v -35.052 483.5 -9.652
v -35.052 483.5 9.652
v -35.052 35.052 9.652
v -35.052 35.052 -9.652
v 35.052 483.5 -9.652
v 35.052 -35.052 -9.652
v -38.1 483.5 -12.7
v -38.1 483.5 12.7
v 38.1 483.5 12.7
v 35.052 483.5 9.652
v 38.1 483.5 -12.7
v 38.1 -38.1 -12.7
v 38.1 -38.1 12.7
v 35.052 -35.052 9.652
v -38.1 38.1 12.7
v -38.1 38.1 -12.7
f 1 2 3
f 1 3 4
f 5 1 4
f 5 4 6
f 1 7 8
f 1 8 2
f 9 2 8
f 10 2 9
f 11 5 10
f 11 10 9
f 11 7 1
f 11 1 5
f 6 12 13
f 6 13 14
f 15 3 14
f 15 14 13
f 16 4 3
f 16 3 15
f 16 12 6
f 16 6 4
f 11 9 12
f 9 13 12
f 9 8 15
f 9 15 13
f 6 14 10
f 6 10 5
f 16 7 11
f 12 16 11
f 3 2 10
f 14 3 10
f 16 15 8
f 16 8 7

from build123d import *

# Parameters (mm, degrees)
SKETCH1_W               = 76.2
SKETCH1_H               = 25.4
SKETCH1_W_2             = 70.104
SKETCH1_H_2             = 19.304
BOSS_EXTRUDE1_DEPTH     = 445.4
SKETCH3_W               = 76.2
SKETCH3_H               = 25.4
SKETCH3_W_2             = 70.104
SKETCH3_H_2             = 19.304
BOSS_EXTRUDE2_DEPTH     = 38.1
SKETCH4_W               = 76.2
SKETCH4_H               = 25.4
SKETCH4_W_2             = 70.104
SKETCH4_H_2             = 19.304
BOSS_EXTRUDE3_DEPTH     = 38.1
CUT_EXTRUDE1_DEPTH      = 13.7
CUT_EXTRUDE1_DEPTH_BACK = 13.7


with BuildPart() as part:
    # Sketch1 → Boss-Extrude1 (new body)
    with BuildSketch(Plane(origin=(0, 0, 0), x_dir=(1, 0, 0), z_dir=(0, 1, 0))):
        Rectangle(SKETCH1_W, SKETCH1_H)
        Rectangle(SKETCH1_W_2, SKETCH1_H_2, mode=Mode.SUBTRACT)
    extrude(amount=BOSS_EXTRUDE1_DEPTH)

    # Sketch3 → Boss-Extrude2 (add)
    with BuildSketch(Plane.XZ):
        Rectangle(SKETCH3_W, SKETCH3_H)
        Rectangle(SKETCH3_W_2, SKETCH3_H_2, mode=Mode.SUBTRACT)
    extrude(amount=BOSS_EXTRUDE2_DEPTH)

    # Sketch4 → Boss-Extrude3 (add)
    with BuildSketch(Plane(origin=(0, 445.4, 0), x_dir=(1, 0, 0), z_dir=(0, 1, 0))):
        Rectangle(SKETCH4_W, SKETCH4_H)
        Rectangle(SKETCH4_W_2, SKETCH4_H_2, mode=Mode.SUBTRACT)
    extrude(amount=BOSS_EXTRUDE3_DEPTH)

    # Sketch5 → Cut-Extrude1 (cut, two sides)
    with BuildSketch(Plane(origin=(-500, 0, 0), x_dir=(1, 0, 0), z_dir=(0, 0, -1))) as cut_extrude1_sk:
        Polygon((607.156068895, 107.156068895), (437.011376746, -62.988623254), (437.011376746, 107.156068895), align=None)
    extrude(amount=CUT_EXTRUDE1_DEPTH, mode=Mode.SUBTRACT)
    extrude(cut_extrude1_sk.sketch, amount=-CUT_EXTRUDE1_DEPTH_BACK, mode=Mode.SUBTRACT)


solid = part.part
